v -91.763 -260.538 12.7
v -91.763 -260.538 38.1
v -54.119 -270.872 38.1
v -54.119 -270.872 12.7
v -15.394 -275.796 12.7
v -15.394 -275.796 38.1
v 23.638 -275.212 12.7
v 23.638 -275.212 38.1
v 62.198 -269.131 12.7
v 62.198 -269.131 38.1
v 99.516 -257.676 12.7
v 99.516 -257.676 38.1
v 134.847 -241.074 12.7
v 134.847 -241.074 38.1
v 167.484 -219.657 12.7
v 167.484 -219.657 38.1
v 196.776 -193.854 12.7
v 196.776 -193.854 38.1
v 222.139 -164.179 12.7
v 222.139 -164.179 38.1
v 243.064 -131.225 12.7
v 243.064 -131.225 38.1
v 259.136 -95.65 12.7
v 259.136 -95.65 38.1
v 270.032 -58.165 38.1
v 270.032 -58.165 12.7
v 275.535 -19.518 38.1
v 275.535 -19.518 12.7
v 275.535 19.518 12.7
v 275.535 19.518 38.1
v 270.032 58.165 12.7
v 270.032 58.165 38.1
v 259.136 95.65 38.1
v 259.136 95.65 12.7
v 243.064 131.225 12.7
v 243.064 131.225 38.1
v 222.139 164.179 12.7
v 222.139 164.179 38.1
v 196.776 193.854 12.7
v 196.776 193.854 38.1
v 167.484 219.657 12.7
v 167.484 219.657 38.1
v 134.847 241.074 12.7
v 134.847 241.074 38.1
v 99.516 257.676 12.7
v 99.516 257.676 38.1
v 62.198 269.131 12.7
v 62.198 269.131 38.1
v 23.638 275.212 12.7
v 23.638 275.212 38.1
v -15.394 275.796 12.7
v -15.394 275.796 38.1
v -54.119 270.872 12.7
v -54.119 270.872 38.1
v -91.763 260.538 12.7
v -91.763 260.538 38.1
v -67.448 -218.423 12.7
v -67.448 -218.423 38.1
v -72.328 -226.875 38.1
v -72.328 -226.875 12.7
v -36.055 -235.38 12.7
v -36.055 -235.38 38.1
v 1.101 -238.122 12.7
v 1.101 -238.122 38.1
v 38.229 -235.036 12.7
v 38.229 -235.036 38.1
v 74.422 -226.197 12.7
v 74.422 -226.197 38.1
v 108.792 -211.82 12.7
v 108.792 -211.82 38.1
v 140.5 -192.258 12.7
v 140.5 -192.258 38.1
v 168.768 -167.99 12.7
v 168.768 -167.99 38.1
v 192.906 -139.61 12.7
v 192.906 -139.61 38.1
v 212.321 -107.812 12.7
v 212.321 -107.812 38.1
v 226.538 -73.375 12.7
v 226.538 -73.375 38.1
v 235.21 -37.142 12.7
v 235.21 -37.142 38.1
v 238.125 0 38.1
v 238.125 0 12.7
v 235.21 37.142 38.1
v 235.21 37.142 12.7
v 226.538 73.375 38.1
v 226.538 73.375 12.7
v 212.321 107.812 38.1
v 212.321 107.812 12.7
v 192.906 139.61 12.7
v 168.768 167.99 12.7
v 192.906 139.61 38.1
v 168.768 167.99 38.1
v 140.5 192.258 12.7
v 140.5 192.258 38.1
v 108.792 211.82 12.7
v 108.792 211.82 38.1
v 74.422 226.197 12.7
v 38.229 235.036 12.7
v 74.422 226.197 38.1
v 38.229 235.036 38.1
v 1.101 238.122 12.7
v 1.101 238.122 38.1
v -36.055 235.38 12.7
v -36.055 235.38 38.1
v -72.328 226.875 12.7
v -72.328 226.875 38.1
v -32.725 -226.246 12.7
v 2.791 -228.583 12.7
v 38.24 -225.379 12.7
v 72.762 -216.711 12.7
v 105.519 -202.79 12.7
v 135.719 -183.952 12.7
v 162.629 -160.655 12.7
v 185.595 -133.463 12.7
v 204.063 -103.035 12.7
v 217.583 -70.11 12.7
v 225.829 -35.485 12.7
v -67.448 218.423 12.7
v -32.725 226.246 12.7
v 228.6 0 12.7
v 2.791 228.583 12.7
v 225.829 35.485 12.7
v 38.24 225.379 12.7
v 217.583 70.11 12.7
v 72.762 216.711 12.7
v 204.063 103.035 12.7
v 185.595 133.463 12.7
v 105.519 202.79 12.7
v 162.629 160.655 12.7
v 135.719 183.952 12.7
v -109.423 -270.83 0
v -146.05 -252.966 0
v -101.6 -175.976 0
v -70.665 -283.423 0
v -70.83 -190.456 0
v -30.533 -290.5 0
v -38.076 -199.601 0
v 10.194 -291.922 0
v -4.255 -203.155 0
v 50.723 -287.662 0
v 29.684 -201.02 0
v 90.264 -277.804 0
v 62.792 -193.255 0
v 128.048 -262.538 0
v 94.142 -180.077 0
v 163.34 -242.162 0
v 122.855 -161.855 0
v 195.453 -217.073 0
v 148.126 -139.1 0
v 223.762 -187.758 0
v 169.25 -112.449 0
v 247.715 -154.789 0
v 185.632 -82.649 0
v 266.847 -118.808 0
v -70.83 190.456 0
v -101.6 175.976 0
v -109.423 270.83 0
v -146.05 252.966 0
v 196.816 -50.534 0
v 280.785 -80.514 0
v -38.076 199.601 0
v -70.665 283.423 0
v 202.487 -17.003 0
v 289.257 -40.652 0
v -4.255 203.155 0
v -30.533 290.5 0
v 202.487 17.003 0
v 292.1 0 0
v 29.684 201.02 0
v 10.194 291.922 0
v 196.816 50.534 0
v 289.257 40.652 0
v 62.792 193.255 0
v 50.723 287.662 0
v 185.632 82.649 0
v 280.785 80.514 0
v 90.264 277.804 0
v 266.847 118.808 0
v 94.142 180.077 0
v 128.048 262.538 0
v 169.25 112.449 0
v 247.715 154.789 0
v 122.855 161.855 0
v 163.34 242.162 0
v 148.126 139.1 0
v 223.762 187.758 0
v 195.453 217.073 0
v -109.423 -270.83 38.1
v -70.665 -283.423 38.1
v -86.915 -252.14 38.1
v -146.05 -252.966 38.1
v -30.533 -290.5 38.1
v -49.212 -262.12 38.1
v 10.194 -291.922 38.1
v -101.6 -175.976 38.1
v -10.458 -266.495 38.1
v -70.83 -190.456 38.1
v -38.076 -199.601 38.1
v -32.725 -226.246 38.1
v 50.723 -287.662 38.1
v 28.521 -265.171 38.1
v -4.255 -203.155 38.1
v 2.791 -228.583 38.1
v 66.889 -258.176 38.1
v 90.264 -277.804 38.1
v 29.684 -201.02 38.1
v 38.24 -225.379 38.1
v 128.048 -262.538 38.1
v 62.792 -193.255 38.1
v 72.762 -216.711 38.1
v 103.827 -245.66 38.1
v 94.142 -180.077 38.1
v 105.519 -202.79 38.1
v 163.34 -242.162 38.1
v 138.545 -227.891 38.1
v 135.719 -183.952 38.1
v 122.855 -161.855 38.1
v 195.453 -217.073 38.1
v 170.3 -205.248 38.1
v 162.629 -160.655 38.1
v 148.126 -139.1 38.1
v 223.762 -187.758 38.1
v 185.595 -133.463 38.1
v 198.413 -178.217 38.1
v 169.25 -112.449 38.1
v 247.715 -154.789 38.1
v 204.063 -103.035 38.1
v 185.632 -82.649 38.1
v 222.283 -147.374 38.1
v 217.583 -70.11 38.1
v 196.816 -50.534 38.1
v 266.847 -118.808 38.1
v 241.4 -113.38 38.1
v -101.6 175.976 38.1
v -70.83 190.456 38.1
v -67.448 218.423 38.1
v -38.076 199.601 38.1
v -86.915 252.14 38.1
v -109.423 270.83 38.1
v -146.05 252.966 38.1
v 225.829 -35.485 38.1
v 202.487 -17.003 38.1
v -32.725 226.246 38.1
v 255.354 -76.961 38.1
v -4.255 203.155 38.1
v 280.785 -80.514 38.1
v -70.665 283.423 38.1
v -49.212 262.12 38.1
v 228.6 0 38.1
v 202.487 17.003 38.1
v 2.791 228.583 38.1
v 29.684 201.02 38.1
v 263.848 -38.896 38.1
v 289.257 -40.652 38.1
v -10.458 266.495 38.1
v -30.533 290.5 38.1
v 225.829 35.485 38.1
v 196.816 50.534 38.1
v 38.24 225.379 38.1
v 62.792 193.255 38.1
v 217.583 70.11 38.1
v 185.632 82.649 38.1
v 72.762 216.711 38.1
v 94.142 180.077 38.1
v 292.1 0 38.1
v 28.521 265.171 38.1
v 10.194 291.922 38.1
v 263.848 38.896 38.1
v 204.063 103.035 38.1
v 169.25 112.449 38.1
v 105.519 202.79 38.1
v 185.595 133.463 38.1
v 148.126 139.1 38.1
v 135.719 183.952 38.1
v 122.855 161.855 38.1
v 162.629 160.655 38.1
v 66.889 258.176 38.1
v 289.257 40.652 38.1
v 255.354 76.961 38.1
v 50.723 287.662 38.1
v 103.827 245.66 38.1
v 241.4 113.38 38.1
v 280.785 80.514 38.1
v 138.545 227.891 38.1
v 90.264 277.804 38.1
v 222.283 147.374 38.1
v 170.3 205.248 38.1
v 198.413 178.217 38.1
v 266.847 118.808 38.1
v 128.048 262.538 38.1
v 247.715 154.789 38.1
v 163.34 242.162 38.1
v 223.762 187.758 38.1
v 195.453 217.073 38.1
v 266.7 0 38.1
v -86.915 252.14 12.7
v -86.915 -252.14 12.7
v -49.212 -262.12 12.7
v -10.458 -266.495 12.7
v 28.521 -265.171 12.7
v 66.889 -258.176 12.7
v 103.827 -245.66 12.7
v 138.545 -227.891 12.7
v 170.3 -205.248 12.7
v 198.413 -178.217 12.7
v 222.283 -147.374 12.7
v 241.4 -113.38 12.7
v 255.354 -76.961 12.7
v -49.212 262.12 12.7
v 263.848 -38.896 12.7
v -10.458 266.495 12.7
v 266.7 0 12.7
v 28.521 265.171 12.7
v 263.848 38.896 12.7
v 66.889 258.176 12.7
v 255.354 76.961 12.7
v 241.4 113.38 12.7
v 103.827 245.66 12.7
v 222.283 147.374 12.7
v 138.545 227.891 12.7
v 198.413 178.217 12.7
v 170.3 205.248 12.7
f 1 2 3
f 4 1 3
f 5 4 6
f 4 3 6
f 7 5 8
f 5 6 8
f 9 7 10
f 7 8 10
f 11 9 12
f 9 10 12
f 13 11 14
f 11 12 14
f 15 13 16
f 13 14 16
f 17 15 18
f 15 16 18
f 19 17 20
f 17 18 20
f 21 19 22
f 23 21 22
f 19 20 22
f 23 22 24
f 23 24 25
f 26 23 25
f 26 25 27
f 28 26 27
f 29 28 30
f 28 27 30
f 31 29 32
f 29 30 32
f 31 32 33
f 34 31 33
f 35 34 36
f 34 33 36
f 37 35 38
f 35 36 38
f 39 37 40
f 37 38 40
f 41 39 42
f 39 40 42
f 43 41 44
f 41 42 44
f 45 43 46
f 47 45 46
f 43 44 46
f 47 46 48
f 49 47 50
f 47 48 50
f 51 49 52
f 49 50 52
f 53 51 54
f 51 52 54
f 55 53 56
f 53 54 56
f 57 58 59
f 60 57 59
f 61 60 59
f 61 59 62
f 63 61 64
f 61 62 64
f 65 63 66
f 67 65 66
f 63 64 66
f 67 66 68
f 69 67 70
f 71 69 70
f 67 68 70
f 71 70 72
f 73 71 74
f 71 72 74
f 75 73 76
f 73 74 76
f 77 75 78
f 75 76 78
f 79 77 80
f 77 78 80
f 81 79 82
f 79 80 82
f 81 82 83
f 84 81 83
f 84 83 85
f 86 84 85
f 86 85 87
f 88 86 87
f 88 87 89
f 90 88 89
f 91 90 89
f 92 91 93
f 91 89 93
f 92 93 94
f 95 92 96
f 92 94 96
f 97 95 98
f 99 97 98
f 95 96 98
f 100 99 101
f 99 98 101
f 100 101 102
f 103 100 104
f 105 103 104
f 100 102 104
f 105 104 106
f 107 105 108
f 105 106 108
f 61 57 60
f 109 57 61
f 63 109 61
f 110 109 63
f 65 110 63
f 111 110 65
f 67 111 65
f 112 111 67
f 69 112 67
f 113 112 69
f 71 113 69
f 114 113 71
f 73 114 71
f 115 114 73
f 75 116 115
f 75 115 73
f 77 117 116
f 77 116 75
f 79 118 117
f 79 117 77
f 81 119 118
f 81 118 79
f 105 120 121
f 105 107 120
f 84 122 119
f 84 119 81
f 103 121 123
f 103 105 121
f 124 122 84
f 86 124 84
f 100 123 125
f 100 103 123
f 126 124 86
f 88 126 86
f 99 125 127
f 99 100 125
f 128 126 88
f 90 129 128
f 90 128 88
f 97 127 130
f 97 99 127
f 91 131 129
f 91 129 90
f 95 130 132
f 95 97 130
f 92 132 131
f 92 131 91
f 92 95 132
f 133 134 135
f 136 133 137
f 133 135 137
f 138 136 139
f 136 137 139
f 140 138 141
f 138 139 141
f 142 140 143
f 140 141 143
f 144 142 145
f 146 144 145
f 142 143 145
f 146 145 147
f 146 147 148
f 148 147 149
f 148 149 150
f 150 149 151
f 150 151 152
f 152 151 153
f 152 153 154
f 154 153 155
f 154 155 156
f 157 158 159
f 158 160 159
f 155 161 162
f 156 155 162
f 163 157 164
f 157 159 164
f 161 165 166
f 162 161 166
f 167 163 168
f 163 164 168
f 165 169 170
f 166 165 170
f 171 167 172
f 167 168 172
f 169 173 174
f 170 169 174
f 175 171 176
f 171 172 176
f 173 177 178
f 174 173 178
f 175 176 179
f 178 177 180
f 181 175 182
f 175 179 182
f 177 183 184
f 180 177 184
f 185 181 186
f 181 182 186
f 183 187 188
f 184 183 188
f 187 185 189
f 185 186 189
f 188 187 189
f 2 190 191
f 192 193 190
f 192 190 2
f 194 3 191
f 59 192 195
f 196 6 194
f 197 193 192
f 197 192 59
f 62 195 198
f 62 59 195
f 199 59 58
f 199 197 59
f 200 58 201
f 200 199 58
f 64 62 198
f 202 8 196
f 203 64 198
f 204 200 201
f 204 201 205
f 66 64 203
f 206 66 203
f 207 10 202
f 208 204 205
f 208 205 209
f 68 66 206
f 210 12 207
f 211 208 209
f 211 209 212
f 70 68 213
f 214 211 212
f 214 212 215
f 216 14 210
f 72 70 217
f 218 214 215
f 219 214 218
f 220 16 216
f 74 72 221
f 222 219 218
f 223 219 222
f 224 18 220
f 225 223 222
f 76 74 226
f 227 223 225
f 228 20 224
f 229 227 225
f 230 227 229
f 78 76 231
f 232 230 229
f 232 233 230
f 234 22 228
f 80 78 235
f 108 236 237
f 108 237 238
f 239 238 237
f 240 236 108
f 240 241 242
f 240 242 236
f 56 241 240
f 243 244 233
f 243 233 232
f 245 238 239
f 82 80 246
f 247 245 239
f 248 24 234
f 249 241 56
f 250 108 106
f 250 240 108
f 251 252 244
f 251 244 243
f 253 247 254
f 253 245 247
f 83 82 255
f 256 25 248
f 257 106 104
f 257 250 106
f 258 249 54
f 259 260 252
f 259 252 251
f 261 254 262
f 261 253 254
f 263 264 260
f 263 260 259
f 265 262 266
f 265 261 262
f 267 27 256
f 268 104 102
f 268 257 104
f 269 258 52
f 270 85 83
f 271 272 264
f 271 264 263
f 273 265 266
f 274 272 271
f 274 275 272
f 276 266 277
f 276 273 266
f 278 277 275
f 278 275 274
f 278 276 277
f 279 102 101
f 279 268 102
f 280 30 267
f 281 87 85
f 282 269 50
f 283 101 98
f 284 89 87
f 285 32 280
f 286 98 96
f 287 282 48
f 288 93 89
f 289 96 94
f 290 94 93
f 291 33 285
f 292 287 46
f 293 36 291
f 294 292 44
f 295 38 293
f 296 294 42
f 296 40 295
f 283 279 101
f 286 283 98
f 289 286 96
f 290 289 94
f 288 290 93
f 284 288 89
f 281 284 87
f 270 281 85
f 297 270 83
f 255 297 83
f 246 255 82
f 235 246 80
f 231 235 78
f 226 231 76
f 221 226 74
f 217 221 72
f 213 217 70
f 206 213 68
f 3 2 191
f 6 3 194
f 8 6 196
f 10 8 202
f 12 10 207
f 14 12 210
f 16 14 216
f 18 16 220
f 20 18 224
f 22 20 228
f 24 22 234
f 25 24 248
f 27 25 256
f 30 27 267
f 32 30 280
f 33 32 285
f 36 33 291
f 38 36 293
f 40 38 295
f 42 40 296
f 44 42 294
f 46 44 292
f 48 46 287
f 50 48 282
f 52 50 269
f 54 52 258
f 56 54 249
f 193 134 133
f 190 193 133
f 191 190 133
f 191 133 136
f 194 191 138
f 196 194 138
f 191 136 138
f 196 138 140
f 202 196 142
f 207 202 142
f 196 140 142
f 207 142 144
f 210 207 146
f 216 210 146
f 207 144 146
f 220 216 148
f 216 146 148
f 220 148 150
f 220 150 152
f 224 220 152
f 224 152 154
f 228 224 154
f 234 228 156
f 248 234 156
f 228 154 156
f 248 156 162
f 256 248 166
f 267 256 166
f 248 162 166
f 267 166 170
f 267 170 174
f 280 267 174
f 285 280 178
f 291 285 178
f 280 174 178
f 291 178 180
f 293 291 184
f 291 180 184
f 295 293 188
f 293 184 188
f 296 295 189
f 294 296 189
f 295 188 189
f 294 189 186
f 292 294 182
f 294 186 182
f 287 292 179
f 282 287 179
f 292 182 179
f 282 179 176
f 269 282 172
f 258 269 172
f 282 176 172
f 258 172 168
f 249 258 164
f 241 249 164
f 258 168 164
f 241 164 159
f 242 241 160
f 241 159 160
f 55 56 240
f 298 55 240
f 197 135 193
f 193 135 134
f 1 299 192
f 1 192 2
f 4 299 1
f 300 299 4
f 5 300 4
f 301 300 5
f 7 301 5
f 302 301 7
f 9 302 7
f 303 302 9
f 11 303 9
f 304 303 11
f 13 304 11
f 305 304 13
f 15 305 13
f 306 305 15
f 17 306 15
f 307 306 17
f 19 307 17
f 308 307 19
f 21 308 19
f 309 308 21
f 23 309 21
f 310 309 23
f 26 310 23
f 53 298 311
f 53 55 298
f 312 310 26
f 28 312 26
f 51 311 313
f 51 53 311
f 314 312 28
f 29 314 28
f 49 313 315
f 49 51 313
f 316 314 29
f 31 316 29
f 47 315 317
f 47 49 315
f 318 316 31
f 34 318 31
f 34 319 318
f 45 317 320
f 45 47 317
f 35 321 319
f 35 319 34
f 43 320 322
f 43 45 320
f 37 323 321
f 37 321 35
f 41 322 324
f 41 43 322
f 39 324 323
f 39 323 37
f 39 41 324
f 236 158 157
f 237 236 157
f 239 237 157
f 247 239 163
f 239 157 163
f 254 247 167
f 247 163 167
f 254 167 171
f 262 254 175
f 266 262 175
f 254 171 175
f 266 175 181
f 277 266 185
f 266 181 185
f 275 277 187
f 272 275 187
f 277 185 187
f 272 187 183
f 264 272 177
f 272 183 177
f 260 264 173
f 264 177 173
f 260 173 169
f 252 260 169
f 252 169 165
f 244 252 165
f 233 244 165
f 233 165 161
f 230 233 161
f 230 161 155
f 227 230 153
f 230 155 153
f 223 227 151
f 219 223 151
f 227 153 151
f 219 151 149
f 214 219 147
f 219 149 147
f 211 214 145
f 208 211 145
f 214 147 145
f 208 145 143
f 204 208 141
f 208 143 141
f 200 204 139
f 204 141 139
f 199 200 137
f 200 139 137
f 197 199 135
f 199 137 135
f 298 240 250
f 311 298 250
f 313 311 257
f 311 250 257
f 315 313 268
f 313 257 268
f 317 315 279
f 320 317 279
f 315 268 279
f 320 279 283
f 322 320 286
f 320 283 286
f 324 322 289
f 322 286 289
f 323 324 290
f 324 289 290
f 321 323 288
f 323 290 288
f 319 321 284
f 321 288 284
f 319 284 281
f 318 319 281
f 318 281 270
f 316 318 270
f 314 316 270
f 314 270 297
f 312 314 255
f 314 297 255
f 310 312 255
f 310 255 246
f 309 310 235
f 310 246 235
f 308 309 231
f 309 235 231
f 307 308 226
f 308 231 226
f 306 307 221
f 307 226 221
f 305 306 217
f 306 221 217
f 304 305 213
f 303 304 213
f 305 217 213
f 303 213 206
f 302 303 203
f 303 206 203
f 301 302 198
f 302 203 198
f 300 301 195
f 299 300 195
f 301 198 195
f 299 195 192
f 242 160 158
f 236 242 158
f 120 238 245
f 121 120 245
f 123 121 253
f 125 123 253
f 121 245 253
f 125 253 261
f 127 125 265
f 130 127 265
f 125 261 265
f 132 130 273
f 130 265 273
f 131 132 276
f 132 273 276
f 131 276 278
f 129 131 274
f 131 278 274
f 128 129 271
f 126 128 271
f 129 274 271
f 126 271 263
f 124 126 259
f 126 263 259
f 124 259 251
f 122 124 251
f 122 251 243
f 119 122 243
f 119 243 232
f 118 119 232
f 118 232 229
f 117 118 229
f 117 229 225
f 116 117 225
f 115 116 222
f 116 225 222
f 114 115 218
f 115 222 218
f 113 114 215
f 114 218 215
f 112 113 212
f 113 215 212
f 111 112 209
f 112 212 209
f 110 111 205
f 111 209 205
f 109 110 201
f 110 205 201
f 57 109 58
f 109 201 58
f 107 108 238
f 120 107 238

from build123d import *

# Parameters (mm, degrees)
F1_DEPTH = 38.1
F3_DEPTH = 25.4


with BuildPart() as f1:
    # F0 (on Top) → F1 (new body)
    with BuildSketch(Plane.XY):
        with BuildLine():
            ThreePointArc((-101.6, 175.976362), (203.2, 0), (-101.6, -175.976362))
            Line((-101.6, -175.976362), (-146.05, -252.96602))
            ThreePointArc((-146.05, -252.96602), (292.1, 0), (-146.05, 252.96602))
            Line((-146.05, 252.96602), (-101.6, 175.976362))
        make_face()
    extrude(amount=F1_DEPTH)

    # F2 (on face) → F3 (cut)
    with BuildSketch(Plane.XY.offset(38.1)):
        with BuildLine():
            ThreePointArc((-67.447957, 218.423289), (228.6, 0), (-67.447957, -218.423289))
            Line((-67.447957, -218.423289), (-72.327528, -226.874953))
            ThreePointArc((-72.327528, -226.874953), (238.125, 0), (-72.327528, 226.874953))
            Line((-72.327528, 226.874953), (-67.447957, 218.423289))
        make_face()
        with BuildLine():
            ThreePointArc((-86.914513, 252.140353), (266.7, 0), (-86.914513, -252.140353))
            Line((-86.914513, -252.140353), (-91.762687, -260.537636))
            ThreePointArc((-91.762687, -260.537636), (276.225, 0), (-91.762687, 260.537636))
            Line((-91.762687, 260.537636), (-86.914513, 252.140353))
        make_face()
    extrude(amount=-F3_DEPTH, mode=Mode.SUBTRACT)


solid = f1.part
